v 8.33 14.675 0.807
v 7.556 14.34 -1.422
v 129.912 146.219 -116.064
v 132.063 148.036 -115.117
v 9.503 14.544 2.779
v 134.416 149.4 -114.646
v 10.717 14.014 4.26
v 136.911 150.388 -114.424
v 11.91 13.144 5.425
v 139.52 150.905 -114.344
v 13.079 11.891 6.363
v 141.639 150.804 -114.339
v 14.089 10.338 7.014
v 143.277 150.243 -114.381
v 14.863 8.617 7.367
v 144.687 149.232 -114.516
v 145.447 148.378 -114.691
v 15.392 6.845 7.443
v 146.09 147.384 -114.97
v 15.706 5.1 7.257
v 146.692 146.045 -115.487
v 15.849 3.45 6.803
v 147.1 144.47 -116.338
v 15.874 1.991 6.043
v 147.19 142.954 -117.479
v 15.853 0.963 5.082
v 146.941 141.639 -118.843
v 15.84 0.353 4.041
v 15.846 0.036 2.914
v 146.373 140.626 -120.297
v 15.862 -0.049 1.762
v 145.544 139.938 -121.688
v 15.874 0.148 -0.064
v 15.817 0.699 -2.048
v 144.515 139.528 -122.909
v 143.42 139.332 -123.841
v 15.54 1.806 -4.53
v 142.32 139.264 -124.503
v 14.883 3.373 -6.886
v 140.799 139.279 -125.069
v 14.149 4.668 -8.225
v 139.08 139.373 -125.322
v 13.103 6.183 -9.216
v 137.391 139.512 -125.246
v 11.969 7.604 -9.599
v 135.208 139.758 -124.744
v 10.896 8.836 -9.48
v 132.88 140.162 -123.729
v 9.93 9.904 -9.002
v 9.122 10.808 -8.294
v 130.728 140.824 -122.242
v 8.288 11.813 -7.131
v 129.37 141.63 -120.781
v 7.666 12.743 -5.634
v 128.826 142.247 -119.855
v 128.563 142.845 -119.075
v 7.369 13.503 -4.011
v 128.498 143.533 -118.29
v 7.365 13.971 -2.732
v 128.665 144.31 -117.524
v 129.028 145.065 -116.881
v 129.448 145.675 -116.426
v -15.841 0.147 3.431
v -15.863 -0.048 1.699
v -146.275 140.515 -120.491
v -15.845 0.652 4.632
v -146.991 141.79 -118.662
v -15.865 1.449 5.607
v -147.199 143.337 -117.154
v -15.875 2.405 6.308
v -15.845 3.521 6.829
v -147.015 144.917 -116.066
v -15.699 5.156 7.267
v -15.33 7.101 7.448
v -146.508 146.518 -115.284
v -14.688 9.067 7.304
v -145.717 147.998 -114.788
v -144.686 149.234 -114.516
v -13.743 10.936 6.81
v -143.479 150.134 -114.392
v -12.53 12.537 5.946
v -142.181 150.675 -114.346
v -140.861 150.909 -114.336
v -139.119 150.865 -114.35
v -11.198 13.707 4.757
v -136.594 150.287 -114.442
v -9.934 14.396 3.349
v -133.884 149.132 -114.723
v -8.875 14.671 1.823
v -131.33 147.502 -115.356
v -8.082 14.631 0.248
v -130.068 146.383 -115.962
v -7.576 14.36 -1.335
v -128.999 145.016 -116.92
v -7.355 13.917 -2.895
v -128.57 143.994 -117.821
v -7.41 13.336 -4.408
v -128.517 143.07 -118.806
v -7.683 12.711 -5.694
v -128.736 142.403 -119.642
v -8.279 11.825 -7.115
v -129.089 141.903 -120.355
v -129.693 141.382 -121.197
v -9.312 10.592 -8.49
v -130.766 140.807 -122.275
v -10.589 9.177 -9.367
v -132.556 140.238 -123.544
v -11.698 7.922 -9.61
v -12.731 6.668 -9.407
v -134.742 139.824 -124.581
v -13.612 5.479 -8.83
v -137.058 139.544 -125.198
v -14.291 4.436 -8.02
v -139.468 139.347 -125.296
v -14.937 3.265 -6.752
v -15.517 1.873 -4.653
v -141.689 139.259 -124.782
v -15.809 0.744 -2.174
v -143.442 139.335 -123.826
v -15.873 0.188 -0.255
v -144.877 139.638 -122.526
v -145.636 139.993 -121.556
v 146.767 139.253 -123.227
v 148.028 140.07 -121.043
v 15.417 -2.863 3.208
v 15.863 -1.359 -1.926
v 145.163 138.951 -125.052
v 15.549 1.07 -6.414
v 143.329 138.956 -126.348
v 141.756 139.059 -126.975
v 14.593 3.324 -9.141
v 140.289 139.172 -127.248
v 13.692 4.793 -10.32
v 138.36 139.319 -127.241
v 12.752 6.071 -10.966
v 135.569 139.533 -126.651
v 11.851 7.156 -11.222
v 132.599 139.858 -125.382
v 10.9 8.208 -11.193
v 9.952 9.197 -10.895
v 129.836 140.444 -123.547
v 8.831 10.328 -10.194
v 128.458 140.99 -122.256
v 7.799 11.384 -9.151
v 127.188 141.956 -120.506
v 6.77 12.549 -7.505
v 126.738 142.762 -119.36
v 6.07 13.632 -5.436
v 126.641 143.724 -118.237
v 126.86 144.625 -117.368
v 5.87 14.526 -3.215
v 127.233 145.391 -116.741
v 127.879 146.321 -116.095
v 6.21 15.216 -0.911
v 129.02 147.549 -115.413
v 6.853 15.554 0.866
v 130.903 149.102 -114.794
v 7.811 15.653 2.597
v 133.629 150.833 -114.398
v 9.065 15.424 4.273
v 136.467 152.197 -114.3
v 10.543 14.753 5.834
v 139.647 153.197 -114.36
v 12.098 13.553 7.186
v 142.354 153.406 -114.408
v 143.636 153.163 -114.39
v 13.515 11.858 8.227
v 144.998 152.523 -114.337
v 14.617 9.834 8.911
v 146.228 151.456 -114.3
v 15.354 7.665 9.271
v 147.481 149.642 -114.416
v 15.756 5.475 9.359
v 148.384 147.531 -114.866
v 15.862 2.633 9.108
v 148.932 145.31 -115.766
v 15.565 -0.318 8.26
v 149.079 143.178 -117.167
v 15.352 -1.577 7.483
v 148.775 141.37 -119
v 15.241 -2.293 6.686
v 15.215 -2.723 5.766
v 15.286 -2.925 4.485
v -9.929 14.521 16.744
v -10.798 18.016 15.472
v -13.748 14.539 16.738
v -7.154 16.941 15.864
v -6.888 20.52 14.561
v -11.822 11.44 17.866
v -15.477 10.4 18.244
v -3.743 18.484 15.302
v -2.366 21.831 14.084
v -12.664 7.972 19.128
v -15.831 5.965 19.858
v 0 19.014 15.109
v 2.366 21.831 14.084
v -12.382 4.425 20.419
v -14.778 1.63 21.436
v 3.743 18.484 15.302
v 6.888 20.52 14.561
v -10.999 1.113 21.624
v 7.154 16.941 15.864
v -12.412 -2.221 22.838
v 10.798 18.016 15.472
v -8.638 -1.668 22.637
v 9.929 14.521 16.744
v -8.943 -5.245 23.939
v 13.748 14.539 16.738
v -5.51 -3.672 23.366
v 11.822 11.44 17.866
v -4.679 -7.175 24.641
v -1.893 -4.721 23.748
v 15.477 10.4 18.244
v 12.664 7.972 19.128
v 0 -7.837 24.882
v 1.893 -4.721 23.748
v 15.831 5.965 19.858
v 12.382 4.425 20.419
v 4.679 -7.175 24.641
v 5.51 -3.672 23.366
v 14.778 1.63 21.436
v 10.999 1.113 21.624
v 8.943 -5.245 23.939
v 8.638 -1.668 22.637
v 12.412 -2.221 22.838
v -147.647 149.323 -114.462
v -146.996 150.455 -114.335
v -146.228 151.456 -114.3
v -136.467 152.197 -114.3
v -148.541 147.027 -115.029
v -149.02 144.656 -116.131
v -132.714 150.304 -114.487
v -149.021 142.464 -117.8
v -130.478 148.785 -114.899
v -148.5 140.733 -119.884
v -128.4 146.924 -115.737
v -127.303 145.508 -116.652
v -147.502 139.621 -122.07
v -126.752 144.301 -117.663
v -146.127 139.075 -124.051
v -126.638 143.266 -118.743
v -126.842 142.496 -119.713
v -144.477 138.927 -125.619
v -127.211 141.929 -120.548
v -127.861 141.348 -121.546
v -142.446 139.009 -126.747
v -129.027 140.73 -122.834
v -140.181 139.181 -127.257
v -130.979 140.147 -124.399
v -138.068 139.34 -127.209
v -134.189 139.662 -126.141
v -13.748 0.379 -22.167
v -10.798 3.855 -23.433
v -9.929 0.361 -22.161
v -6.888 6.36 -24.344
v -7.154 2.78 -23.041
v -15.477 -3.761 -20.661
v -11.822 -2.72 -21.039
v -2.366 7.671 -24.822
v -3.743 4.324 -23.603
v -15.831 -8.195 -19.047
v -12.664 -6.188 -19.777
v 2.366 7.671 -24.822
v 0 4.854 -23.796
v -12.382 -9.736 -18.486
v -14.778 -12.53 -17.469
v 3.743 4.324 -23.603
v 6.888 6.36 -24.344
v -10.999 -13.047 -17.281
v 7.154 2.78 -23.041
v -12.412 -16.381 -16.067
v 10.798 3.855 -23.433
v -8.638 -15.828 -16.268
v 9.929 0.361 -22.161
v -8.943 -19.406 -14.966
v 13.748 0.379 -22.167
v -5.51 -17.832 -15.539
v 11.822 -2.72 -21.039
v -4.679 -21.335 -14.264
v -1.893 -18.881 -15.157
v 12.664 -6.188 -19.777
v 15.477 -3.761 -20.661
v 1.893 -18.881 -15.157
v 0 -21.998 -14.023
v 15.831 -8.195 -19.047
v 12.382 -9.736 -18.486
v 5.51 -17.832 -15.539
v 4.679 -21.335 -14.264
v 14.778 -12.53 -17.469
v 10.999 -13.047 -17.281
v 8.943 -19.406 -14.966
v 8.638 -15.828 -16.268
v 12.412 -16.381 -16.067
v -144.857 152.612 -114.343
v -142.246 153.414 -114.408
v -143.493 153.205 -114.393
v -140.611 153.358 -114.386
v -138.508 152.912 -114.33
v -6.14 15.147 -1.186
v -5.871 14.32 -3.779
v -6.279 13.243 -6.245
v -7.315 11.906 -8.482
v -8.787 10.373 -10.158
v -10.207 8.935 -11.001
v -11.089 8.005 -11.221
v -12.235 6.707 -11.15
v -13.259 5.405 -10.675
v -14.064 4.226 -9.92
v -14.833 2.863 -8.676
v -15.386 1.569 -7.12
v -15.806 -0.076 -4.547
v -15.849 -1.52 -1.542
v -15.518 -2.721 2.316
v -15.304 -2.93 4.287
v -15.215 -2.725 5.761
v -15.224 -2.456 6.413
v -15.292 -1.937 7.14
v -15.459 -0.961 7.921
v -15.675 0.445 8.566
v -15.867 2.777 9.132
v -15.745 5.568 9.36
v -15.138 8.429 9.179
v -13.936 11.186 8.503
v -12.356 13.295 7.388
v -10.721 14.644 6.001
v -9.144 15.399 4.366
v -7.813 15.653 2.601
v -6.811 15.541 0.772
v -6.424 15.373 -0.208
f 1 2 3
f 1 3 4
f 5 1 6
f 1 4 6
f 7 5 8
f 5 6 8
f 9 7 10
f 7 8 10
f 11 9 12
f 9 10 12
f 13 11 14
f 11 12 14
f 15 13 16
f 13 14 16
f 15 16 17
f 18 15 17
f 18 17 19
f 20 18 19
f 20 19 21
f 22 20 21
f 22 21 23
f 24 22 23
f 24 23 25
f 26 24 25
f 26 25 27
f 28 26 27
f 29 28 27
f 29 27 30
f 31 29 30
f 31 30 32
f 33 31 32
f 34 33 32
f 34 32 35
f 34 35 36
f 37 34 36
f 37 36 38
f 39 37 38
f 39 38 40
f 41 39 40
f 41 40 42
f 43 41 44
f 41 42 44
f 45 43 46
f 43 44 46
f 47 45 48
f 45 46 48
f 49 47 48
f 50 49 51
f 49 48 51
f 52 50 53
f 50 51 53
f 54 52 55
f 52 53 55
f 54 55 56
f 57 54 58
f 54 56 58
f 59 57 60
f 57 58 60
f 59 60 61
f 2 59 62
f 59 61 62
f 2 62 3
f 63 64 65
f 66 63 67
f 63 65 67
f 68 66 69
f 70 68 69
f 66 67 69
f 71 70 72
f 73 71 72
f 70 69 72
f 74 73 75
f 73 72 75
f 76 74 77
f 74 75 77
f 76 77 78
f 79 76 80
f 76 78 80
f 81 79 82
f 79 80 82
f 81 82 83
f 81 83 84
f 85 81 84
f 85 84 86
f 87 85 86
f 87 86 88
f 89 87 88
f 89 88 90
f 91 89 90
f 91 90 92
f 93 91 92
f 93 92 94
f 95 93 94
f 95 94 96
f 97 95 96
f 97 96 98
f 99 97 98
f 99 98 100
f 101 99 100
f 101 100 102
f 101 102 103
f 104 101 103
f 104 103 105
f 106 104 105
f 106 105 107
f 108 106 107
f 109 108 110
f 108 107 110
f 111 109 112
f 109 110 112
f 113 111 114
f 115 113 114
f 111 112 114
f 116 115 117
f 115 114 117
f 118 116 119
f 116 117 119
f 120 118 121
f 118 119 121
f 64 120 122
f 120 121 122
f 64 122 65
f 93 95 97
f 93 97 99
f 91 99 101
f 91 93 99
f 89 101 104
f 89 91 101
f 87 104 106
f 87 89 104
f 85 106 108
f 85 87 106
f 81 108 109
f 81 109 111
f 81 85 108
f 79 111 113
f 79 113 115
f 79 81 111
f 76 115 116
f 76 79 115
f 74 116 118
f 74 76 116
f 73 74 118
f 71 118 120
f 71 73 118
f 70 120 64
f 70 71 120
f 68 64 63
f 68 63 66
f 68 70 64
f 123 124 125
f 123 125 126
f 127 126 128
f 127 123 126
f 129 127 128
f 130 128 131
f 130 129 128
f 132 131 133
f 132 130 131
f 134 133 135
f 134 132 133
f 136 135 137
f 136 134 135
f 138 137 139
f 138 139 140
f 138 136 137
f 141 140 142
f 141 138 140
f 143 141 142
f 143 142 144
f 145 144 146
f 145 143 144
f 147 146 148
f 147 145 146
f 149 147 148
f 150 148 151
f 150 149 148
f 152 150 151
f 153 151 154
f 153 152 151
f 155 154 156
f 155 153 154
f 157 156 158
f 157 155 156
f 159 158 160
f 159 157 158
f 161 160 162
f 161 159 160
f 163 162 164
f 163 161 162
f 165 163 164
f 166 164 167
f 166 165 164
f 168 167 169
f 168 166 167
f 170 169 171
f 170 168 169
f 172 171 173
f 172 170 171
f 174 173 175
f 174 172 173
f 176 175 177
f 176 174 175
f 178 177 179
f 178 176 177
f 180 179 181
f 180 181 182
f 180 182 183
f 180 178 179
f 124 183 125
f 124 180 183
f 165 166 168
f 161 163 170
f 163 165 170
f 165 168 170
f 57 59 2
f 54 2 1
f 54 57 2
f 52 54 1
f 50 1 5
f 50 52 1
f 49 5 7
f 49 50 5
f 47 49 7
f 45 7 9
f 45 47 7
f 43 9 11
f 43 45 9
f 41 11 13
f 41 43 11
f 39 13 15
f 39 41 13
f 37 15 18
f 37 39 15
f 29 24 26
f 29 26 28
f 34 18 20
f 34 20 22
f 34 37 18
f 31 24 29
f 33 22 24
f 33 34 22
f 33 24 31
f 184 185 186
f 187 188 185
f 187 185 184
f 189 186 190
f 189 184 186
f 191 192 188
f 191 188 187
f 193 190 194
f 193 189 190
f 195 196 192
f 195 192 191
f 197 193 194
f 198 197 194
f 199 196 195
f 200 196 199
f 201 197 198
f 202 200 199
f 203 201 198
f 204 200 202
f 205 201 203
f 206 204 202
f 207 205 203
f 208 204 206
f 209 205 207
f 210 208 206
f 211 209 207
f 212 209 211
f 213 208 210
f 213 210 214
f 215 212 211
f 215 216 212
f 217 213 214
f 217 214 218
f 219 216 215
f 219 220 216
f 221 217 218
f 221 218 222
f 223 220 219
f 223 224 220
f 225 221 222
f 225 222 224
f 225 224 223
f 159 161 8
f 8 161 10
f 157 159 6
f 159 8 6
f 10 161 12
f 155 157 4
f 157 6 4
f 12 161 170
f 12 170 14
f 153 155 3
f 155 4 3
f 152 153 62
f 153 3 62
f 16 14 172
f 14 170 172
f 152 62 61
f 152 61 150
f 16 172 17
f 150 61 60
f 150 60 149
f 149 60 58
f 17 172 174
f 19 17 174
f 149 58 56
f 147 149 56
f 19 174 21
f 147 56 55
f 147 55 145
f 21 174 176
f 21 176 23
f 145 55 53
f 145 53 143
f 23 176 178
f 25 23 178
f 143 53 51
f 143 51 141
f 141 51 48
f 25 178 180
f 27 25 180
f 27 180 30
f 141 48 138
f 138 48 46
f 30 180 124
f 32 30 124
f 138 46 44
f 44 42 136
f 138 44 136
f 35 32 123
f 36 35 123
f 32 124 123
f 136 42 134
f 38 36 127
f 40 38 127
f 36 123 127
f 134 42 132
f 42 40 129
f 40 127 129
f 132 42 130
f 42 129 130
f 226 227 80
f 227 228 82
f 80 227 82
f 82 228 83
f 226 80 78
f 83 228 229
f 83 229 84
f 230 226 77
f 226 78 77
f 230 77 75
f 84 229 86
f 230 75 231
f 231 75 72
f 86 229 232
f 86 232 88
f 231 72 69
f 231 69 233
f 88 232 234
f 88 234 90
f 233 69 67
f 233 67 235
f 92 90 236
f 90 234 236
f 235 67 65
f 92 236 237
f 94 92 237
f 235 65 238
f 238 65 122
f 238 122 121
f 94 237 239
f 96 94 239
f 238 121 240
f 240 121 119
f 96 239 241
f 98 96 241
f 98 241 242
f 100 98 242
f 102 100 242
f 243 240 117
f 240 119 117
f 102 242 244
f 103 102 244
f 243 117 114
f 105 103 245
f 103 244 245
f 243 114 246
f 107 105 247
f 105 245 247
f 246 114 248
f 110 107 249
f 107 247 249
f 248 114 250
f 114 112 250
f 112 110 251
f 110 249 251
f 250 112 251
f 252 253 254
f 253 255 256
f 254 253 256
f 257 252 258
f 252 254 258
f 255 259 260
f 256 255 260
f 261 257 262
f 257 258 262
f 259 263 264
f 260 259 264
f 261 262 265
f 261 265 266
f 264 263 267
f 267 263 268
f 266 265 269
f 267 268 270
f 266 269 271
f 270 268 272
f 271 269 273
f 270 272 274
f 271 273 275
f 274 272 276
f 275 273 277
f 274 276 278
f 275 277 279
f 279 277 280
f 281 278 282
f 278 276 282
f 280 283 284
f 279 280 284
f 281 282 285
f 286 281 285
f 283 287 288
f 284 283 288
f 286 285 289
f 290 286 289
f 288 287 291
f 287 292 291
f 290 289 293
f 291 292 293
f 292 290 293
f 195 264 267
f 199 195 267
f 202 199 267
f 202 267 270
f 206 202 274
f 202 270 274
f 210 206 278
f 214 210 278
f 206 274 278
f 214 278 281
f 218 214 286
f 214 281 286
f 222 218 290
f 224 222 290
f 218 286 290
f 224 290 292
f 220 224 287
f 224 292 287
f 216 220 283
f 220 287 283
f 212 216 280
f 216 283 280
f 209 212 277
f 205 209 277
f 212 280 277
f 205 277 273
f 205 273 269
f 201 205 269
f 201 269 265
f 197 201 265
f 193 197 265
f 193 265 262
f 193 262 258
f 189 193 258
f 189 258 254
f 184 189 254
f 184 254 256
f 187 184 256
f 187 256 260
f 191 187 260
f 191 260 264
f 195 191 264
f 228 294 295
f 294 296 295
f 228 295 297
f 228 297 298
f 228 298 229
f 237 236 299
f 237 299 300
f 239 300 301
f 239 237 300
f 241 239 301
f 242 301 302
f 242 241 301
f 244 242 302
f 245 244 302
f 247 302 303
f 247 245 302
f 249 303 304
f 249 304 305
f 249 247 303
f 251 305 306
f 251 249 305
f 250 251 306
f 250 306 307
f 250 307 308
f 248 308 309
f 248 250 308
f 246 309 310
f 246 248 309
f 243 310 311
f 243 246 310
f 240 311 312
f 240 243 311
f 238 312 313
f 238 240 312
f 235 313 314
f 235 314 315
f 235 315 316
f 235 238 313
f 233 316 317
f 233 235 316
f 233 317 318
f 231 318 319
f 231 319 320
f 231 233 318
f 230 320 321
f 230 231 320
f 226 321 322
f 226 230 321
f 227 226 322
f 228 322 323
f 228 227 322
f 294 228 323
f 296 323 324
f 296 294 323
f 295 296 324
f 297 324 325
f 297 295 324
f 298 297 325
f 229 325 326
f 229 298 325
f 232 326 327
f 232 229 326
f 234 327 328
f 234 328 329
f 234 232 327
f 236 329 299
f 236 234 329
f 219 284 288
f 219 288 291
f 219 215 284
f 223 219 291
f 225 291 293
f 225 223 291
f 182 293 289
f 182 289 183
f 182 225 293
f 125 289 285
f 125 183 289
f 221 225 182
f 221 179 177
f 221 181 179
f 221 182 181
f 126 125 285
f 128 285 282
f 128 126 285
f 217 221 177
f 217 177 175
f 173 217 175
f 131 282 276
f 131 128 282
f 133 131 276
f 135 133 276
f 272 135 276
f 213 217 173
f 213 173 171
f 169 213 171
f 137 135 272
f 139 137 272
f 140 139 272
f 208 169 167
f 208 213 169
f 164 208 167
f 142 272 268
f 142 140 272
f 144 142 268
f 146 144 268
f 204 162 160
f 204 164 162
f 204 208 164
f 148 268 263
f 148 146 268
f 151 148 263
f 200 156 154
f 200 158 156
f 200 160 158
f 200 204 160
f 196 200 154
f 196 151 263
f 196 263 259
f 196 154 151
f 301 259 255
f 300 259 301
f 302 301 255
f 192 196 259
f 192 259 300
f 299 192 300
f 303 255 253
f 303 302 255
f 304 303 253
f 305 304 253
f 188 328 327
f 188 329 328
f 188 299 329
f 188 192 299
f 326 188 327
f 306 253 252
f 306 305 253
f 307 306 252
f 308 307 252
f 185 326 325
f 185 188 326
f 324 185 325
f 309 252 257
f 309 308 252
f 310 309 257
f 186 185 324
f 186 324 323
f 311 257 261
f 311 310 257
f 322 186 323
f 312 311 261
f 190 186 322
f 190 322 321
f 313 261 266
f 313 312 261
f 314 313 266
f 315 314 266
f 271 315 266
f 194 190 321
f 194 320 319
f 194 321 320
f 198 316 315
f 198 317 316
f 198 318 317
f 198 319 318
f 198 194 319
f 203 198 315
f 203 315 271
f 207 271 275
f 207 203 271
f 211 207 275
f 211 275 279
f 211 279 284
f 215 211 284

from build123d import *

# Parameters (mm, degrees)
SKETCH1_R               = 15.875
BOSS_EXTRUDE1_DEPTH     = 20.701
SWEEP1_PROFILE_R        = 9.525
SWEEP2_PROFILE_R        = 9.525
CUT_EXTRUDE2_REACH      = 371.805
SKETCH36_R              = 7.9375
CUT_EXTRUDE3_REACH      = 371.805
CUT_EXTRUDE3_END_RADIUS = 15.875
SKETCH37_R              = 7.9375
SKETCH77_R              = 15.875
BOSS_EXTRUDE2_DEPTH     = 41.402
CUT_EXTRUDE1_REACH      = 251.445
SKETCH2_R               = 12.7
SKETCH83_R              = 12.7


with BuildPart() as part:
    # Sketch1 → Boss-Extrude1 (new, symmetric)
    with BuildSketch(Plane(origin=(0, 0, 0), x_dir=(1, 0, 0), z_dir=(0, 0.34202014332566943, 0.9396926207859081))):
        with Locations(Location((0, 0, 0), (0, 0, 270))):
            Circle(SKETCH1_R)
    extrude(amount=BOSS_EXTRUDE1_DEPTH, both=True)

    # Sweep1: sweep along a path in Sketch4
    with BuildLine(Plane(origin=(0, 3.144101118, 3.616874596), x_dir=(1, 0, 0), z_dir=(0, 0.6560590289905084, 0.754709580222771))) as sweep1_path:
        Line((-5.08, -4.165974834), (-143.483994092, 193.495413453))
    # Sweep1 profile (on start of the path) → Sweep1 (sweep)
    with BuildSketch(Plane(origin=(-5.08, 0, 6.35), x_dir=(0.7330812283825076, 0.6801410975622587, 0), z_dir=(-0.5735764363510472, 0.6182218954839692, -0.5374120947718255))):
        Circle(SWEEP1_PROFILE_R)
    sweep(path=sweep1_path.line)

    # Sweep2: sweep along a path in Sketch15
    with BuildLine(Plane(origin=(0, 3.144101118, 3.616874596), x_dir=(1, 0, 0), z_dir=(0, 0.6560590289905084, 0.754709580222771))) as sweep2_path:
        Line((5.08, -4.165974834), (143.483994092, 193.495413453))
    # Sweep2 profile (on start of the path) → Sweep2 (sweep)
    with BuildSketch(Plane(origin=(5.08, 0, 6.35), x_dir=(0.7330812283825074, -0.6801410975622589, 0), z_dir=(0.5735764363510474, 0.6182218954839692, -0.5374120947718254))):
        Circle(SWEEP2_PROFILE_R)
    sweep(path=sweep2_path.line)

    # Sketch36 → Cut-Extrude2 (cut, up to next)
    with BuildSketch(Plane(origin=(-138.117895022, 148.868575223, -129.409478119), x_dir=(0.8191108775847741, 0.4394391101382058, -0.36871484741361205), z_dir=(-0.5735764363510472, 0.6182218954839691, -0.5374120947718255)), mode=Mode.PRIVATE) as cut_extrude2_sk1:
        with Locations(Location((-6.502422539, -4.857839146, 0), (0, 0, 154.073467295))):
            Circle(SKETCH36_R)
    cut_extrude2_tool1 = extrude(cut_extrude2_sk1.sketch, amount=-CUT_EXTRUDE2_REACH, mode=Mode.PRIVATE) & part.part
    add(cut_extrude2_tool1.solids().sort_by_distance((-143.483994, 149.176943, -123.327538))[0], mode=Mode.SUBTRACT)

    # Cut-Extrude3: up to this cylinder (the profile starts outside it)
    cut_extrude3_end = Plane(origin=(0, -22.186319293, -60.956411279), z_dir=(0, -0.34202014332566943, -0.9396926207859081)) * Cylinder(CUT_EXTRUDE3_END_RADIUS, 776.36, mode=Mode.PRIVATE)
    # Sketch37 → Cut-Extrude3 (cut, up to the surface)
    with BuildSketch(Plane(origin=(138.117895022, 148.868575223, -129.409478119), x_dir=(0.8191108775847737, -0.4394391101382061, 0.36871484741361227), z_dir=(0.5735764363510476, 0.6182218954839689, -0.5374120947718255)), mode=Mode.PRIVATE) as cut_extrude3_sk1:
        with Locations(Location((6.502422539, -4.857839146, 0), (0, 0, 205.926532705))):
            Circle(SKETCH37_R)
    cut_extrude3_tool1 = extrude(cut_extrude3_sk1.sketch, amount=-CUT_EXTRUDE3_REACH, mode=Mode.PRIVATE) - cut_extrude3_end
    add(cut_extrude3_tool1.solids().sort_by_distance((143.483994, 149.176943, -123.327538))[0], mode=Mode.SUBTRACT)

    # Sketch77 → Boss-Extrude2 (add)
    with BuildSketch(Plane(origin=(0, 7.080158987, 19.452576943), x_dir=(1, 0, 0), z_dir=(0, 0.34202014332566943, 0.9396926207859082))):
        with Locations(Location((0, 0, 0), (0, 0, 270))):
            Circle(SKETCH77_R)
    extrude(amount=-BOSS_EXTRUDE2_DEPTH)

    # Sketch2 → Cut-Extrude1 (cut, up to next)
    with BuildSketch(Plane(origin=(0, -7.080158987, -19.452576943), x_dir=(-1, 0, 0), z_dir=(0, -0.34202014332566943, -0.9396926207859081)), mode=Mode.PRIVATE) as cut_extrude1_sk1:
        with Locations(Location((0, 0, 0), (0, 0, 90))):
            Circle(SKETCH2_R)
    cut_extrude1_tool1 = extrude(cut_extrude1_sk1.sketch, amount=-CUT_EXTRUDE1_REACH, mode=Mode.PRIVATE) & part.part
    add(cut_extrude1_tool1.solids().sort_by_distance((0, -7.080159, -19.452577))[0], mode=Mode.SUBTRACT)

    # Cut-Sweep1: sweep along a path in Sketch40
    with BuildLine(Plane(origin=(-106.934, 0, -127), x_dir=(1, 0, 0), z_dir=(0, 0, 1))) as cut_sweep1_path:
        Line((-63.663829669, 149.860844852), (100.20235662, 162.304768472))
        ThreePointArc((100.20235662, 162.304768472), (106.934, 162.56), (113.66564338, 162.304768472))
        Line((113.66564338, 162.304768472), (277.531829669, 149.860844852))
    # Sketch83 → Cut-Sweep1 (sweep, cut)
    with BuildSketch(Plane(origin=(170.597829669, 149.860844852, -127), x_dir=(0, 0, 1), z_dir=(-0.99712900418122, 0.07572152283577528, 0))):
        with Locations((0, -0.255231528)):
            Circle(SKETCH83_R)
    sweep(path=cut_sweep1_path.line, mode=Mode.SUBTRACT)


solid = part.part
